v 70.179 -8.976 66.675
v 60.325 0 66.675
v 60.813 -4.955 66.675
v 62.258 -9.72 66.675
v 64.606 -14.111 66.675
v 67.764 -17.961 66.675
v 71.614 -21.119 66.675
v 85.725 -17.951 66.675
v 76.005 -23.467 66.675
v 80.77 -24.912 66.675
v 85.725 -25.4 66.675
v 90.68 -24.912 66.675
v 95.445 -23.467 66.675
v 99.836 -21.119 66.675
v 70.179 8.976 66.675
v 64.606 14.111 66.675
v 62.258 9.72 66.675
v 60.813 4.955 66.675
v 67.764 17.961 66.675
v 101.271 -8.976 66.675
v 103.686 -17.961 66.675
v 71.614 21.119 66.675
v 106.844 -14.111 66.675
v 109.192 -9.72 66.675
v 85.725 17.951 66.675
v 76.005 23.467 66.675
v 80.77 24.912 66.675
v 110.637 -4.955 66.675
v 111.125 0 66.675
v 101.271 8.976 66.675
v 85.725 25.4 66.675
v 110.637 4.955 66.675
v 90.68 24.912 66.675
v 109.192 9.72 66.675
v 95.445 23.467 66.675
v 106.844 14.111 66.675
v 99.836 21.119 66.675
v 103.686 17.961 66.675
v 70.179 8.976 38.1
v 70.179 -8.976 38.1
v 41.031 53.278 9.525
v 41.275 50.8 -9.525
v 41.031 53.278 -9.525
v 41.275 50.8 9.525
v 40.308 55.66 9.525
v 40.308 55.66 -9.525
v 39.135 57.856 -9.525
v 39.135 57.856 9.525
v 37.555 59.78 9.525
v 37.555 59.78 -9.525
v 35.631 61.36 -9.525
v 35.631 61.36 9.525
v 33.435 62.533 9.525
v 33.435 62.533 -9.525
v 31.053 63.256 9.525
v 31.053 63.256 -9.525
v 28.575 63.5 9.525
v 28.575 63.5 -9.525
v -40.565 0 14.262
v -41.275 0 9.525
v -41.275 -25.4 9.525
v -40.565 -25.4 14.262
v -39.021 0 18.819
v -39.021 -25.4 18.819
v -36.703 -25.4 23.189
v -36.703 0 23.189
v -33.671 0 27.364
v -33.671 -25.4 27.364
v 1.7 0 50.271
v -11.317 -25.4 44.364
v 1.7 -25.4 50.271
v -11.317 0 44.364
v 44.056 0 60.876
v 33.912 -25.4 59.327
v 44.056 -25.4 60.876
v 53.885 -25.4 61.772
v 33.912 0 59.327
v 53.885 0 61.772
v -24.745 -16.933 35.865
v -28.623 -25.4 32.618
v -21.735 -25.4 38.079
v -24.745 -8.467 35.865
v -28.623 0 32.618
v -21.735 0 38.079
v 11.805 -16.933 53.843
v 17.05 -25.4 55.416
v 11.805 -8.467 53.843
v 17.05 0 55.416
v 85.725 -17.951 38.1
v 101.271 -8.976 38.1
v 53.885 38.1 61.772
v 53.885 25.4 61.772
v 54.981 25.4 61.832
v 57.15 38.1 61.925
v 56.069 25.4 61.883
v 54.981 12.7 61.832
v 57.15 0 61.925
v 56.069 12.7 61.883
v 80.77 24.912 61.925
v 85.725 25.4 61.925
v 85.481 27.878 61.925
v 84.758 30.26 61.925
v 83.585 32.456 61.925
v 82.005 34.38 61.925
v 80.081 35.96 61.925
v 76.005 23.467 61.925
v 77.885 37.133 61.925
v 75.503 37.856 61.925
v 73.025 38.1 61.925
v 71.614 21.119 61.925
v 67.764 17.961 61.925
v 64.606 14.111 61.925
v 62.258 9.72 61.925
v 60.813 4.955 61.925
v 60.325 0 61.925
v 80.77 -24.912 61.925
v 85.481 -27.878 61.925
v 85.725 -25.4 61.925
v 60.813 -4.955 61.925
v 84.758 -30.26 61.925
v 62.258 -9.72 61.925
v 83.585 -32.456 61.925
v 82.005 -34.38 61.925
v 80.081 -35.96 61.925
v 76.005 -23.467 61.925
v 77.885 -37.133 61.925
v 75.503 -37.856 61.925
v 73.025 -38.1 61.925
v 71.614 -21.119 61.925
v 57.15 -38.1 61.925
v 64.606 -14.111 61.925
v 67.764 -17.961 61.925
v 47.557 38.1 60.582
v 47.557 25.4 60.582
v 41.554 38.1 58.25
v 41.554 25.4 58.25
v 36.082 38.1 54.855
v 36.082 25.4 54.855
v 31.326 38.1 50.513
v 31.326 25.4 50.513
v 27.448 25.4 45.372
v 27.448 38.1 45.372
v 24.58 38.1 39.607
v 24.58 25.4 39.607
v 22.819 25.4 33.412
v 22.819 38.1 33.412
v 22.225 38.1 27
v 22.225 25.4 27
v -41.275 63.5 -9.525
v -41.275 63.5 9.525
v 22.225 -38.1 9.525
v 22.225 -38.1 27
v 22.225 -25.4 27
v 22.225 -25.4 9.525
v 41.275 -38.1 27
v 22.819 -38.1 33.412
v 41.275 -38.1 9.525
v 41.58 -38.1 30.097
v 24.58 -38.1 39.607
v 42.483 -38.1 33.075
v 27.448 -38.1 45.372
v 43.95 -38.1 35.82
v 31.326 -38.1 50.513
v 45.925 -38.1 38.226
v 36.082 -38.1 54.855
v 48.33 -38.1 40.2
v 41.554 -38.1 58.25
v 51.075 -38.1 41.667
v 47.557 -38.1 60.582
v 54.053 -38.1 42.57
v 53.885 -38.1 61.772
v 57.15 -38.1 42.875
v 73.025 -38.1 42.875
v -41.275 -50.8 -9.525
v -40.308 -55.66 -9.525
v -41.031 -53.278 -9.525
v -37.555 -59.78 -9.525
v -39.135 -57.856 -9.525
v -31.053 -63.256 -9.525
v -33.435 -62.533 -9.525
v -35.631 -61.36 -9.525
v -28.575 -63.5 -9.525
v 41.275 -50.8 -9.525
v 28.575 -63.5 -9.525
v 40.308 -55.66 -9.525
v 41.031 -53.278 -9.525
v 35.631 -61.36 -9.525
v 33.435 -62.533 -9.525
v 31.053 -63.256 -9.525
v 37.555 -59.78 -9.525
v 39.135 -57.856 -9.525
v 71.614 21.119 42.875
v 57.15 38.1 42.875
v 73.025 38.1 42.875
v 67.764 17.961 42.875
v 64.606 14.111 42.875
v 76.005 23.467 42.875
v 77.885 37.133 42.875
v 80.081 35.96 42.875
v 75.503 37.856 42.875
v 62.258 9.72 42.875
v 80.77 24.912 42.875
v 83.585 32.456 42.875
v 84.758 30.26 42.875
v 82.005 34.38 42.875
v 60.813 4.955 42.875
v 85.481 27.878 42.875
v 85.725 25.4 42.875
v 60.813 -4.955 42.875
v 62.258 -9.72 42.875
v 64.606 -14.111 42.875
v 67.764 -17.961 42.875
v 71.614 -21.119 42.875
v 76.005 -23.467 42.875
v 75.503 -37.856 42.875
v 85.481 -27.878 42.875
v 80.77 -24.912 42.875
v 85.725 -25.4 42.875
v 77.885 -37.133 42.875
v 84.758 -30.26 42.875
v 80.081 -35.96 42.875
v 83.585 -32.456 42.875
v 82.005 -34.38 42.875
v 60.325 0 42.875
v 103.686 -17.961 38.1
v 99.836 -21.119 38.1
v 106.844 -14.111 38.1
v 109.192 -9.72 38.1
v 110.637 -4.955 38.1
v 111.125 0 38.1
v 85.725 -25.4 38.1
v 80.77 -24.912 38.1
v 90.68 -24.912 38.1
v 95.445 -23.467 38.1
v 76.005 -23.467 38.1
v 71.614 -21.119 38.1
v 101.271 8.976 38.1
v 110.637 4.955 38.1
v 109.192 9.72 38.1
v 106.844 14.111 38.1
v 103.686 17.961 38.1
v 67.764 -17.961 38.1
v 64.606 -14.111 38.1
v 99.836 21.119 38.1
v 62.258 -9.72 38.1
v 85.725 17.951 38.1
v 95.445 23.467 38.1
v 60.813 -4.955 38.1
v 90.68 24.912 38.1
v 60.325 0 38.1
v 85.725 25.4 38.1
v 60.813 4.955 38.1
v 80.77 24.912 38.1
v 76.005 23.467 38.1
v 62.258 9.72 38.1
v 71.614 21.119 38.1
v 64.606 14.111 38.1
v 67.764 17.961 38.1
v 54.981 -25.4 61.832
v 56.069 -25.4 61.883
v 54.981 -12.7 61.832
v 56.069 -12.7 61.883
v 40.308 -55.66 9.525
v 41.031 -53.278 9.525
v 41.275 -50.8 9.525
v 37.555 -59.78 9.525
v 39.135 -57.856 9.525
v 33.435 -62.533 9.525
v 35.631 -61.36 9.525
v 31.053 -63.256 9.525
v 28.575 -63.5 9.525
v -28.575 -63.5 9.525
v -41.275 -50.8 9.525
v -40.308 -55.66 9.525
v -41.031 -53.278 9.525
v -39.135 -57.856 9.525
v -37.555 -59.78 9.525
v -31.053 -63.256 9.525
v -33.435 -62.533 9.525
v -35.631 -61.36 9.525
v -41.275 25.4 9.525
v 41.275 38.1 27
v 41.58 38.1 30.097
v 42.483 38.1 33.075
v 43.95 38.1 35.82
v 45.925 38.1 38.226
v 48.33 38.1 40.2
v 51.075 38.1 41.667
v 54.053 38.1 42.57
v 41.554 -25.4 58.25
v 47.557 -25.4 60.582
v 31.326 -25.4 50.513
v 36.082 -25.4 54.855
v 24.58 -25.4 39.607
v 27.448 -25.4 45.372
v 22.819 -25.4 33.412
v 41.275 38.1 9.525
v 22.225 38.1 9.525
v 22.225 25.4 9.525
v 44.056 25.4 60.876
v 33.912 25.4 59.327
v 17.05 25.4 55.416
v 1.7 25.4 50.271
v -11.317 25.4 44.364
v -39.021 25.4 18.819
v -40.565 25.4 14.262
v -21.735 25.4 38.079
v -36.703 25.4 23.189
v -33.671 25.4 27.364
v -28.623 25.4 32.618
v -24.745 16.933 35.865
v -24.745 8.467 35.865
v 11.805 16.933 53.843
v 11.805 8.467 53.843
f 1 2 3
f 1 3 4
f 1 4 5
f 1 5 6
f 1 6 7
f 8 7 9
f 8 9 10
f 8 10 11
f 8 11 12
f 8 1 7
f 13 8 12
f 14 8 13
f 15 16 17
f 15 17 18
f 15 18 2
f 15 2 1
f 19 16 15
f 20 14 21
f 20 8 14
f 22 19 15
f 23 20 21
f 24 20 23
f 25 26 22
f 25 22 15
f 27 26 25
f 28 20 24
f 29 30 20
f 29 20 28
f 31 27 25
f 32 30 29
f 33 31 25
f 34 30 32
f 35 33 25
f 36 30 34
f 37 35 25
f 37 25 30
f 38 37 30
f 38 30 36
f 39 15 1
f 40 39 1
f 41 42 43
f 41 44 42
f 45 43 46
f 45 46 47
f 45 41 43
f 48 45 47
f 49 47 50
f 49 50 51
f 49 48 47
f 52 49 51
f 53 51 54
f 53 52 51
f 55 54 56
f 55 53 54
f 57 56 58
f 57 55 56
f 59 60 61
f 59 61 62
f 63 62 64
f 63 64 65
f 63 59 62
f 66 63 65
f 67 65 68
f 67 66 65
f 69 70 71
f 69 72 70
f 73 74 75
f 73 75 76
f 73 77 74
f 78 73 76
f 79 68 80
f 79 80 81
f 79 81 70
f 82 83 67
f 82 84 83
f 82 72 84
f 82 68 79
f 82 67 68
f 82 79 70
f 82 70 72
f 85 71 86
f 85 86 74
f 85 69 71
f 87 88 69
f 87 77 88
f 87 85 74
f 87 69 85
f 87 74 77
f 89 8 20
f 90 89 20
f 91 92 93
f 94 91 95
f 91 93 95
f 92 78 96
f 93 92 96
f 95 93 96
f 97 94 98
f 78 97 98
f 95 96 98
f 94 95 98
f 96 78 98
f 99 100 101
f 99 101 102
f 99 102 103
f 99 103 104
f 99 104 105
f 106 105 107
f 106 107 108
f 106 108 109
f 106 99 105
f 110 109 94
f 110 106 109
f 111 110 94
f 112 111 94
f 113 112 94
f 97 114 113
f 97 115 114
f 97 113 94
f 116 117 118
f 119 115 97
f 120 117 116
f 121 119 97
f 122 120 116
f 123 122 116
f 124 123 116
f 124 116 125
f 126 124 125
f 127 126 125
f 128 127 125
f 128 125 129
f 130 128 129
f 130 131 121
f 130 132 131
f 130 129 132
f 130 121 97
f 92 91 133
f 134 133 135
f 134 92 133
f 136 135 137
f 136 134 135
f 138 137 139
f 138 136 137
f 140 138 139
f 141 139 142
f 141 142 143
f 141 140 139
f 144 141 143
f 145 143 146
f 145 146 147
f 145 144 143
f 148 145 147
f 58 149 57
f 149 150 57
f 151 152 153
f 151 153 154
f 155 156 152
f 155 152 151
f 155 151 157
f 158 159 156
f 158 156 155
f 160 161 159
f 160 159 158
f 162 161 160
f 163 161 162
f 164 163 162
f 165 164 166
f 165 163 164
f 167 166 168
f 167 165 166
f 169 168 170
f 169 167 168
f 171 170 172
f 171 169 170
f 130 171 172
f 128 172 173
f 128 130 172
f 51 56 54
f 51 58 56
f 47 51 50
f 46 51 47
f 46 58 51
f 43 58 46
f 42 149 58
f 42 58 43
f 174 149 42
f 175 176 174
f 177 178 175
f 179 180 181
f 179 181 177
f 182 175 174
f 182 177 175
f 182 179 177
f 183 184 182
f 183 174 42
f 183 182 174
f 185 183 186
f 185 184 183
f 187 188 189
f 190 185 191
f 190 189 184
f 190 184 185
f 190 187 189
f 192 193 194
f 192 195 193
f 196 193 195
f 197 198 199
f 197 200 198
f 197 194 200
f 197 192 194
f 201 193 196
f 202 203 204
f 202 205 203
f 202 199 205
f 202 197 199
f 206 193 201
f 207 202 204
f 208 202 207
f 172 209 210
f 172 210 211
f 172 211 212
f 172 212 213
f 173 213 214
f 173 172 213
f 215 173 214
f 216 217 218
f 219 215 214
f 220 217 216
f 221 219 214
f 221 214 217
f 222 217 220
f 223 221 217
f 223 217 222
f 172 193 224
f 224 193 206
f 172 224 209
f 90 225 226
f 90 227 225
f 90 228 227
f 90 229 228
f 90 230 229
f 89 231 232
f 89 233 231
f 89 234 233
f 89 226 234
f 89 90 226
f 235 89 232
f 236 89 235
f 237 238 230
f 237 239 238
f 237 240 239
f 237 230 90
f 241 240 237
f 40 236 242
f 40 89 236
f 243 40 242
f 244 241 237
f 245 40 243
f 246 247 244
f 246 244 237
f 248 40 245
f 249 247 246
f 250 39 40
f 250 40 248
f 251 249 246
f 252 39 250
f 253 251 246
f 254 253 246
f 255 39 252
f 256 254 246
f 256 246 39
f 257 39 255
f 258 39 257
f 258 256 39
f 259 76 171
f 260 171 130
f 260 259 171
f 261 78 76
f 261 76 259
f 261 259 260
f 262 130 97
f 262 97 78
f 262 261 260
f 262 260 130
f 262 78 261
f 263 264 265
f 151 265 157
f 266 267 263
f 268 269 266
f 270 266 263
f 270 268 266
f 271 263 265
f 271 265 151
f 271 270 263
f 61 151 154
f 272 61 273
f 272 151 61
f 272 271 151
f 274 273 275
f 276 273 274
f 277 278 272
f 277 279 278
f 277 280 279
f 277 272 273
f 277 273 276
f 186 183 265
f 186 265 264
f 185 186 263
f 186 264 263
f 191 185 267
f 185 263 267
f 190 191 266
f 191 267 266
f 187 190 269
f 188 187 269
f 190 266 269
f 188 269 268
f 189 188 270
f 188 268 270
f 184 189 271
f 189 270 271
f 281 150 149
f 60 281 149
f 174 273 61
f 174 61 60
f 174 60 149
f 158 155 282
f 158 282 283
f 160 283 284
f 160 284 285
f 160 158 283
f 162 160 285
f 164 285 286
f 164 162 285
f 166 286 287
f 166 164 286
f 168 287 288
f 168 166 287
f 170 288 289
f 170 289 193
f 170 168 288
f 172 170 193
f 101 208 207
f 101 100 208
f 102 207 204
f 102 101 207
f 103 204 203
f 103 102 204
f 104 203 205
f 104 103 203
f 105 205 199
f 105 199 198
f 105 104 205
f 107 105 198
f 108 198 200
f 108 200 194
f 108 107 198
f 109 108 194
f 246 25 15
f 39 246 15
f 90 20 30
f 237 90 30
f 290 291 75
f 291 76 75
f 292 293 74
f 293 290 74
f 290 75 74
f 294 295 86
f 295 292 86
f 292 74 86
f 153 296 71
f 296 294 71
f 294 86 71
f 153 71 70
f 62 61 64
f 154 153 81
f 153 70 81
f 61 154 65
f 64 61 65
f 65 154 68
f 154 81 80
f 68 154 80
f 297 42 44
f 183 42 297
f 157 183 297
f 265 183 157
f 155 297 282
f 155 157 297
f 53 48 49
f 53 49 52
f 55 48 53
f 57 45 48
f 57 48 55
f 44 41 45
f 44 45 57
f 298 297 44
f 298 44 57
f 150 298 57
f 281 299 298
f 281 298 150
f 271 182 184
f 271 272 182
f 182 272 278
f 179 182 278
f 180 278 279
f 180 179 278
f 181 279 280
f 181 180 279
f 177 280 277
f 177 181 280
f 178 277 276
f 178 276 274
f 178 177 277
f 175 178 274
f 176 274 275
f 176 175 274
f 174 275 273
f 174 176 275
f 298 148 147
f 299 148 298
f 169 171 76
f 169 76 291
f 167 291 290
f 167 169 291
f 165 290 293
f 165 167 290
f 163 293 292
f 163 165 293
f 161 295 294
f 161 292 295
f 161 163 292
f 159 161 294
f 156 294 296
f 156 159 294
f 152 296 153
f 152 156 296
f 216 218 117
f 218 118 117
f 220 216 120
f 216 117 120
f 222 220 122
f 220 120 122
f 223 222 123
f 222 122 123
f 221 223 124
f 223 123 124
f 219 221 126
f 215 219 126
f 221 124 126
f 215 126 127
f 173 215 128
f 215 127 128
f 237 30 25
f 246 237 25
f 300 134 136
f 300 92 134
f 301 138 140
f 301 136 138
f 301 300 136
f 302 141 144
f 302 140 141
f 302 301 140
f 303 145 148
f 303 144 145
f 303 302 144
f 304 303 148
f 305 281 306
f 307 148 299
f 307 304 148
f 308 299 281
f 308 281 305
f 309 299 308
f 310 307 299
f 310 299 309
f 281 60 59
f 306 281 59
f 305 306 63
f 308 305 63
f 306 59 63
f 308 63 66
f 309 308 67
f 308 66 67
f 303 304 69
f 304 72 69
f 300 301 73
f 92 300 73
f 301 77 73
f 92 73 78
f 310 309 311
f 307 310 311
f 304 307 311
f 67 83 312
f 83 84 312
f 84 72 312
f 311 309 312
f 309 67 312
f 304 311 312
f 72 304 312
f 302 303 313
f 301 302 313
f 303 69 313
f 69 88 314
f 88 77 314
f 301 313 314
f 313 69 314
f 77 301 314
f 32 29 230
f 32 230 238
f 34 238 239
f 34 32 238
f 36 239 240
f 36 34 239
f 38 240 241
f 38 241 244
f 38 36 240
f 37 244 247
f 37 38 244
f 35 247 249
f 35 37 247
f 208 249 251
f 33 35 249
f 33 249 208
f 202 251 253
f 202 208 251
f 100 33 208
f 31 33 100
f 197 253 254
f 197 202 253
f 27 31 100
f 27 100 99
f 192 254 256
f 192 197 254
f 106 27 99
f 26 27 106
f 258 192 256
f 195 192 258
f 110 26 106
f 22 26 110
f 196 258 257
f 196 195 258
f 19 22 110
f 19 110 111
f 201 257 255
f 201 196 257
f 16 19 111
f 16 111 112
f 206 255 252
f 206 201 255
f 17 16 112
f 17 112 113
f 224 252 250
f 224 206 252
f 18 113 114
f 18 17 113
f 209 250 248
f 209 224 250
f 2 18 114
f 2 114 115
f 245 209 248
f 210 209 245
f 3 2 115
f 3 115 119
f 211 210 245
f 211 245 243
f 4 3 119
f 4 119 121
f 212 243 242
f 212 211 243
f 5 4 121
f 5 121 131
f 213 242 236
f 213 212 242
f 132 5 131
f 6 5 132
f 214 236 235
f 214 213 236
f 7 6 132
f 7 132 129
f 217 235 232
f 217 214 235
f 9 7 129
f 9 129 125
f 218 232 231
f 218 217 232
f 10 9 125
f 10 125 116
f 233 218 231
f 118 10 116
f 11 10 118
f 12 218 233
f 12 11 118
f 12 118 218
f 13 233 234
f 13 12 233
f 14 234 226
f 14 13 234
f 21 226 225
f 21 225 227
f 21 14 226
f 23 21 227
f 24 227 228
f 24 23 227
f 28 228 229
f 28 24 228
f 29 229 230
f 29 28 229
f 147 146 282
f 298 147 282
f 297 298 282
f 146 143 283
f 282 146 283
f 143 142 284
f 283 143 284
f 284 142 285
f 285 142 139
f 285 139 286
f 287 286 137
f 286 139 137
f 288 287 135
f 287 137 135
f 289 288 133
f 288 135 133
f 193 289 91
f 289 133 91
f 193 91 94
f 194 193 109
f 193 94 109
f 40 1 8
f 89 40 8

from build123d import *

# Parameters (mm, degrees)
F1_DEPTH = 63.5
F2_DEPTH = 25.4
F0_W     = 25.4
F0_H     = 19.05
F3_DEPTH = 38.1
F6_DEPTH = 91.186
F7_R     = 12.69999


# Not quite as in the source:
# - a fillet or chamfer is up to 0.001 mm smaller than in the source, because OpenCascade refuses the exact size


with BuildPart() as f1:
    # F0 (on Front) → F1 (new body, symmetric)
    with BuildSketch(Plane.XZ):
        Polygon((22.225, 9.525), (-41.275, 9.525), (-41.275, -9.525), (41.275, -9.525), (41.275, 9.525), align=None)
    extrude(amount=F1_DEPTH, both=True)

    # F0 (on Front) → F2 (join, symmetric)
    with BuildSketch(Plane.XZ):
        with BuildLine():
            add(Edge.make_bspline(
                [(-41.275, 9.525), (-39.5856284224, 39.4828766469), (13.870125209, 59.4306981306), (53.8854342407, 61.7722898912)],
                knots=[0, 0, 0, 0, 108.5245810491, 108.5245810491, 108.5245810491, 108.5245810491], degree=3))
            Line((-41.275, 9.525), (22.225, 9.525))
            Line((22.225, 9.525), (22.225, 27.0002))
            ThreePointArc((22.225, 27.0002), (31.3258777096, 50.5133948686), (53.8854342407, 61.7722898912))
        make_face()
    extrude(amount=F2_DEPTH, both=True)

    # F0 (on Front) → F3 (join, symmetric)
    with BuildSketch(Plane.XZ):
        with BuildLine():
            Line((22.225, 27.0002), (22.225, 9.525))
            Line((22.225, 9.525), (41.275, 9.525))
            Line((41.275, 9.525), (41.275, 27.0002))
            ThreePointArc((41.275, 27.0002), (45.9246798487, 38.2255201513), (57.15, 42.8752))
            Line((57.15, 42.8752), (60.325, 42.8752))
            Line((60.325, 42.8752), (60.325, 61.9252))
            Line((60.325, 61.9252), (57.15, 61.9252))
            add(Edge.make_bspline(
                [(53.8854342407, 61.7722898912), (54.9842067368, 61.8365871986), (56.0728453275, 61.8876096574), (57.15, 61.9252)],
                knots=[108.5245810491, 108.5245810491, 108.5245810491, 108.5245810491, 111.5045361635, 111.5045361635, 111.5045361635, 111.5045361635], degree=3))
            ThreePointArc((53.8854342407, 61.7722898912), (31.3258777096, 50.5133948686), (22.225, 27.0002))
        make_face()
        with Locations((73.025, 52.4002)):
            Rectangle(F0_W, F0_H)
    extrude(amount=F3_DEPTH, both=True)

    # F0 (on Front) → F4 (revolve)
    with BuildSketch(Plane.XZ):
        Polygon((85.725, 66.675), (85.725, 61.9252), (85.725, 42.8752), (85.725, 38.1), (111.125, 38.1), (111.125, 66.675), align=None)
    revolve(axis=Axis((85.725, 0, 52.3875), (0, 0, 1)))

    # F5 (on face) → F6 (cut)
    with BuildSketch(Plane.XY.offset(66.675)):
        Polygon((101.2713760138, -8.9757043765), (101.2713760138, 8.9757043765), (85.725, 17.9514087529), (70.1786239862, 8.9757043765), (70.1786239862, -8.9757043765), (85.725, -17.9514087529), align=None)
    extrude(amount=-F6_DEPTH, mode=Mode.SUBTRACT)

    # F7 (radius 12.7 in the source; OpenCascade refuses exactly that, so slightly less here)
    f7_edges = [f1.edges().sort_by_distance(p)[0] for p in [
        (85.725, -38.1, 52.4002),
        (85.725, 38.1, 52.4002),
        (41.275, -63.5, 0),
        (-41.275, -63.5, 0),
        (41.275, 63.5, 0),
    ]]
    fillet(f7_edges, radius=F7_R)


solid = f1.part
